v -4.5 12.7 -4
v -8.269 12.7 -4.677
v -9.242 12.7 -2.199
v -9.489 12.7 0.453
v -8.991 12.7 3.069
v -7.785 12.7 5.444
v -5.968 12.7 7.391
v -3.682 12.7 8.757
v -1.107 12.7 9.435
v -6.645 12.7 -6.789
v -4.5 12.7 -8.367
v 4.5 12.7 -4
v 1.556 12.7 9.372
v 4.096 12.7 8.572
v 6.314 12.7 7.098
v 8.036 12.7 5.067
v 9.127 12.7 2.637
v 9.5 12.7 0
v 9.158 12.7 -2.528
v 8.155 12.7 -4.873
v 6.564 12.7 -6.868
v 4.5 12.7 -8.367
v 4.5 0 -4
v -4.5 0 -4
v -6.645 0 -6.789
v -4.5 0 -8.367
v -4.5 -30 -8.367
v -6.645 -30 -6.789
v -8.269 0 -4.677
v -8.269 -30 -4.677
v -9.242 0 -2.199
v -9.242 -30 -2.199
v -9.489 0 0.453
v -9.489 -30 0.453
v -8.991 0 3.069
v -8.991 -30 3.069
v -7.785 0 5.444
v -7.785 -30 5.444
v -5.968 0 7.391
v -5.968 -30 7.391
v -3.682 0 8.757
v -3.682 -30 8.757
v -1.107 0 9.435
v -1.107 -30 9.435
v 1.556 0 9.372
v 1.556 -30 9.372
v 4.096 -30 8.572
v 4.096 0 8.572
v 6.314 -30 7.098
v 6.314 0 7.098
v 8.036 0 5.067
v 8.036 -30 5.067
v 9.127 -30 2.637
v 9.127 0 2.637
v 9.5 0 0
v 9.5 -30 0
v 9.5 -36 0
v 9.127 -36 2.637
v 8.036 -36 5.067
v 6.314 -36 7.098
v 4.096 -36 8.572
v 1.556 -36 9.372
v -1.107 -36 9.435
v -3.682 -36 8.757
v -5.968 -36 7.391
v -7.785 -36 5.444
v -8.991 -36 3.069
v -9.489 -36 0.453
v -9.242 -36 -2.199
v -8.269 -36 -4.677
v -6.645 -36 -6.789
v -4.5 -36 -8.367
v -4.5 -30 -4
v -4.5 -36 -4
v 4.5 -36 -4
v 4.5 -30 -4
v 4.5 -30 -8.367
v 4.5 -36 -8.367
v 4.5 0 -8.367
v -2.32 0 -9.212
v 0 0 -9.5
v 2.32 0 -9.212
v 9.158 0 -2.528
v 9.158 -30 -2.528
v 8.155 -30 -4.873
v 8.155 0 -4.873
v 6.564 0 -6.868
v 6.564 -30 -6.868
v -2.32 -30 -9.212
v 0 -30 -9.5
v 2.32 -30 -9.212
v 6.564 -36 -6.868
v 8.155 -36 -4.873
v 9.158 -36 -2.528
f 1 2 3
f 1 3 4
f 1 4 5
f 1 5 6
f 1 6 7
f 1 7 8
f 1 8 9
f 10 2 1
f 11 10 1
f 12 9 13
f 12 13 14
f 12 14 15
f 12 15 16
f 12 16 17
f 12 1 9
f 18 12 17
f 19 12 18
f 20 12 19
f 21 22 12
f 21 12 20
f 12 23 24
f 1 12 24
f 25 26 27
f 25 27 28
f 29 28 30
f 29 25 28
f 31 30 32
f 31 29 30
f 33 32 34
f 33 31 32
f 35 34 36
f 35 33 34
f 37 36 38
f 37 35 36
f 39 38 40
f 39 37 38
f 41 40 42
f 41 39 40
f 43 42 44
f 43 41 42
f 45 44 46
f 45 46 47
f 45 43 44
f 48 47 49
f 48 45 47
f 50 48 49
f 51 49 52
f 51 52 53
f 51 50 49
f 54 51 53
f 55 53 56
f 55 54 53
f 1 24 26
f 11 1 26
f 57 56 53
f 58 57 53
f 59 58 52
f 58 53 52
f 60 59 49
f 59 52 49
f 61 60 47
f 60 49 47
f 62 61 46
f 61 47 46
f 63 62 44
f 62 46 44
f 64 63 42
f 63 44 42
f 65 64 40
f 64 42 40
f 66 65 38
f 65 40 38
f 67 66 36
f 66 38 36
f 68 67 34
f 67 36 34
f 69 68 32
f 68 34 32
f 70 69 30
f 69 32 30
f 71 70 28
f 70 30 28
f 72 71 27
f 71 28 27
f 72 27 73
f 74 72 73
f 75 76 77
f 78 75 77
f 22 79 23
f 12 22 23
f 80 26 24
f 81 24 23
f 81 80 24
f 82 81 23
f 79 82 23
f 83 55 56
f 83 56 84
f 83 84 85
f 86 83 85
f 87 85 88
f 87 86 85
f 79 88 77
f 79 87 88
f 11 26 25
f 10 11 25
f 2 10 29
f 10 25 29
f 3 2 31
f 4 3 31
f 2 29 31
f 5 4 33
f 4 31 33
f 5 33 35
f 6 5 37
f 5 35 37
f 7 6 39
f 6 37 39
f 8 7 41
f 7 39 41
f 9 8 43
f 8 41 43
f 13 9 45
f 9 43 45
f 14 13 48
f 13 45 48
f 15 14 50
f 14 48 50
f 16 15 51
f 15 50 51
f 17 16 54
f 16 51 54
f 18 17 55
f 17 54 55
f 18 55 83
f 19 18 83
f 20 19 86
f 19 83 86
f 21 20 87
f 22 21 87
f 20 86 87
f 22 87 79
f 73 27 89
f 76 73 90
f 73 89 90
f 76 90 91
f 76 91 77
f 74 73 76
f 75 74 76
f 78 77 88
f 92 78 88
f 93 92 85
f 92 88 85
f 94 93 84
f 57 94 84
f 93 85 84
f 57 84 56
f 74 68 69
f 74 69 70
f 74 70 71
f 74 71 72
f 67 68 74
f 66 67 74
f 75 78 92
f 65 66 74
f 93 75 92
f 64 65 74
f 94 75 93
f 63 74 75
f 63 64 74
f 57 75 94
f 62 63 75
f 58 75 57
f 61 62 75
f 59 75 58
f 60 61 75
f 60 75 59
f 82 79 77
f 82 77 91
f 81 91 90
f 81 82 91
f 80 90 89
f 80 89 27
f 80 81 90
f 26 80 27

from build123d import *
from build123d.topology import SkipClean

# Parameters (mm, degrees)
BOSS_EXTRUDE1_DEPTH = 12.7
BOSS_EXTRUDE2_DEPTH = 30
BOSS_EXTRUDE3_DEPTH = 6


with BuildPart() as part:
    # Sketch1 → Boss-Extrude1 (new body)
    with BuildSketch(Plane(origin=(0, 0, 0), x_dir=(1, 0, 0), z_dir=(0, 1, 0))):
        with BuildLine():
            Line((4.5, 8.366600265), (4.5, 4))
            Line((4.5, 4), (-4.5, 4))
            Line((-4.5, 4), (-4.5, 8.366600265))
            ThreePointArc((-4.5, 8.366600265), (-4.873397172, -8.154753215), (9.5, 0))
            ThreePointArc((9.5, 0), (8.154753215, 4.873397172), (4.5, 8.366600265))
        make_face()
    extrude(amount=BOSS_EXTRUDE1_DEPTH)

    # Sketch1<3> → Boss-Extrude2 (add)
    with BuildSketch(Plane(origin=(0, 0, 0), x_dir=(1, 0, 0), z_dir=(0, 1, 0))):
        with BuildLine():
            Line((4.5, 8.366600265), (4.5, 4))
            Line((4.5, 4), (-4.5, 4))
            Line((-4.5, 4), (-4.5, 8.366600265))
            ThreePointArc((-4.5, 8.366600265), (-4.873397172, -8.154753215), (9.5, 0))
            ThreePointArc((9.5, 0), (8.154753215, 4.873397172), (4.5, 8.366600265))
        make_face()
        with BuildLine():
            Line((-4.5, 4), (4.5, 4))
            Line((4.5, 4), (4.5, 8.366600265))
            ThreePointArc((4.5, 8.366600265), (0, 9.5), (-4.5, 8.366600265))
            Line((-4.5, 8.366600265), (-4.5, 4))
        make_face()
    extrude(amount=-BOSS_EXTRUDE2_DEPTH)

    # Sketch2 → Boss-Extrude3 (add)
    with SkipClean():  # the faces are left unmerged after this step: merging them gives an invalid solid
        with BuildSketch(Plane.XZ.offset(30)):
            with BuildLine():
                Line((-4.5, -4), (4.5, -4))
                Line((4.5, -4), (4.5, -8.366600265))
                ThreePointArc((4.5, -8.366600265), (8.154753215, -4.873397172), (9.5, 0))
                ThreePointArc((9.5, 0), (-4.873397172, 8.154753215), (-4.5, -8.366600265))
                Line((-4.5, -8.366600265), (-4.5, -4))
            make_face()
        extrude(amount=BOSS_EXTRUDE3_DEPTH)


solid = part.part
